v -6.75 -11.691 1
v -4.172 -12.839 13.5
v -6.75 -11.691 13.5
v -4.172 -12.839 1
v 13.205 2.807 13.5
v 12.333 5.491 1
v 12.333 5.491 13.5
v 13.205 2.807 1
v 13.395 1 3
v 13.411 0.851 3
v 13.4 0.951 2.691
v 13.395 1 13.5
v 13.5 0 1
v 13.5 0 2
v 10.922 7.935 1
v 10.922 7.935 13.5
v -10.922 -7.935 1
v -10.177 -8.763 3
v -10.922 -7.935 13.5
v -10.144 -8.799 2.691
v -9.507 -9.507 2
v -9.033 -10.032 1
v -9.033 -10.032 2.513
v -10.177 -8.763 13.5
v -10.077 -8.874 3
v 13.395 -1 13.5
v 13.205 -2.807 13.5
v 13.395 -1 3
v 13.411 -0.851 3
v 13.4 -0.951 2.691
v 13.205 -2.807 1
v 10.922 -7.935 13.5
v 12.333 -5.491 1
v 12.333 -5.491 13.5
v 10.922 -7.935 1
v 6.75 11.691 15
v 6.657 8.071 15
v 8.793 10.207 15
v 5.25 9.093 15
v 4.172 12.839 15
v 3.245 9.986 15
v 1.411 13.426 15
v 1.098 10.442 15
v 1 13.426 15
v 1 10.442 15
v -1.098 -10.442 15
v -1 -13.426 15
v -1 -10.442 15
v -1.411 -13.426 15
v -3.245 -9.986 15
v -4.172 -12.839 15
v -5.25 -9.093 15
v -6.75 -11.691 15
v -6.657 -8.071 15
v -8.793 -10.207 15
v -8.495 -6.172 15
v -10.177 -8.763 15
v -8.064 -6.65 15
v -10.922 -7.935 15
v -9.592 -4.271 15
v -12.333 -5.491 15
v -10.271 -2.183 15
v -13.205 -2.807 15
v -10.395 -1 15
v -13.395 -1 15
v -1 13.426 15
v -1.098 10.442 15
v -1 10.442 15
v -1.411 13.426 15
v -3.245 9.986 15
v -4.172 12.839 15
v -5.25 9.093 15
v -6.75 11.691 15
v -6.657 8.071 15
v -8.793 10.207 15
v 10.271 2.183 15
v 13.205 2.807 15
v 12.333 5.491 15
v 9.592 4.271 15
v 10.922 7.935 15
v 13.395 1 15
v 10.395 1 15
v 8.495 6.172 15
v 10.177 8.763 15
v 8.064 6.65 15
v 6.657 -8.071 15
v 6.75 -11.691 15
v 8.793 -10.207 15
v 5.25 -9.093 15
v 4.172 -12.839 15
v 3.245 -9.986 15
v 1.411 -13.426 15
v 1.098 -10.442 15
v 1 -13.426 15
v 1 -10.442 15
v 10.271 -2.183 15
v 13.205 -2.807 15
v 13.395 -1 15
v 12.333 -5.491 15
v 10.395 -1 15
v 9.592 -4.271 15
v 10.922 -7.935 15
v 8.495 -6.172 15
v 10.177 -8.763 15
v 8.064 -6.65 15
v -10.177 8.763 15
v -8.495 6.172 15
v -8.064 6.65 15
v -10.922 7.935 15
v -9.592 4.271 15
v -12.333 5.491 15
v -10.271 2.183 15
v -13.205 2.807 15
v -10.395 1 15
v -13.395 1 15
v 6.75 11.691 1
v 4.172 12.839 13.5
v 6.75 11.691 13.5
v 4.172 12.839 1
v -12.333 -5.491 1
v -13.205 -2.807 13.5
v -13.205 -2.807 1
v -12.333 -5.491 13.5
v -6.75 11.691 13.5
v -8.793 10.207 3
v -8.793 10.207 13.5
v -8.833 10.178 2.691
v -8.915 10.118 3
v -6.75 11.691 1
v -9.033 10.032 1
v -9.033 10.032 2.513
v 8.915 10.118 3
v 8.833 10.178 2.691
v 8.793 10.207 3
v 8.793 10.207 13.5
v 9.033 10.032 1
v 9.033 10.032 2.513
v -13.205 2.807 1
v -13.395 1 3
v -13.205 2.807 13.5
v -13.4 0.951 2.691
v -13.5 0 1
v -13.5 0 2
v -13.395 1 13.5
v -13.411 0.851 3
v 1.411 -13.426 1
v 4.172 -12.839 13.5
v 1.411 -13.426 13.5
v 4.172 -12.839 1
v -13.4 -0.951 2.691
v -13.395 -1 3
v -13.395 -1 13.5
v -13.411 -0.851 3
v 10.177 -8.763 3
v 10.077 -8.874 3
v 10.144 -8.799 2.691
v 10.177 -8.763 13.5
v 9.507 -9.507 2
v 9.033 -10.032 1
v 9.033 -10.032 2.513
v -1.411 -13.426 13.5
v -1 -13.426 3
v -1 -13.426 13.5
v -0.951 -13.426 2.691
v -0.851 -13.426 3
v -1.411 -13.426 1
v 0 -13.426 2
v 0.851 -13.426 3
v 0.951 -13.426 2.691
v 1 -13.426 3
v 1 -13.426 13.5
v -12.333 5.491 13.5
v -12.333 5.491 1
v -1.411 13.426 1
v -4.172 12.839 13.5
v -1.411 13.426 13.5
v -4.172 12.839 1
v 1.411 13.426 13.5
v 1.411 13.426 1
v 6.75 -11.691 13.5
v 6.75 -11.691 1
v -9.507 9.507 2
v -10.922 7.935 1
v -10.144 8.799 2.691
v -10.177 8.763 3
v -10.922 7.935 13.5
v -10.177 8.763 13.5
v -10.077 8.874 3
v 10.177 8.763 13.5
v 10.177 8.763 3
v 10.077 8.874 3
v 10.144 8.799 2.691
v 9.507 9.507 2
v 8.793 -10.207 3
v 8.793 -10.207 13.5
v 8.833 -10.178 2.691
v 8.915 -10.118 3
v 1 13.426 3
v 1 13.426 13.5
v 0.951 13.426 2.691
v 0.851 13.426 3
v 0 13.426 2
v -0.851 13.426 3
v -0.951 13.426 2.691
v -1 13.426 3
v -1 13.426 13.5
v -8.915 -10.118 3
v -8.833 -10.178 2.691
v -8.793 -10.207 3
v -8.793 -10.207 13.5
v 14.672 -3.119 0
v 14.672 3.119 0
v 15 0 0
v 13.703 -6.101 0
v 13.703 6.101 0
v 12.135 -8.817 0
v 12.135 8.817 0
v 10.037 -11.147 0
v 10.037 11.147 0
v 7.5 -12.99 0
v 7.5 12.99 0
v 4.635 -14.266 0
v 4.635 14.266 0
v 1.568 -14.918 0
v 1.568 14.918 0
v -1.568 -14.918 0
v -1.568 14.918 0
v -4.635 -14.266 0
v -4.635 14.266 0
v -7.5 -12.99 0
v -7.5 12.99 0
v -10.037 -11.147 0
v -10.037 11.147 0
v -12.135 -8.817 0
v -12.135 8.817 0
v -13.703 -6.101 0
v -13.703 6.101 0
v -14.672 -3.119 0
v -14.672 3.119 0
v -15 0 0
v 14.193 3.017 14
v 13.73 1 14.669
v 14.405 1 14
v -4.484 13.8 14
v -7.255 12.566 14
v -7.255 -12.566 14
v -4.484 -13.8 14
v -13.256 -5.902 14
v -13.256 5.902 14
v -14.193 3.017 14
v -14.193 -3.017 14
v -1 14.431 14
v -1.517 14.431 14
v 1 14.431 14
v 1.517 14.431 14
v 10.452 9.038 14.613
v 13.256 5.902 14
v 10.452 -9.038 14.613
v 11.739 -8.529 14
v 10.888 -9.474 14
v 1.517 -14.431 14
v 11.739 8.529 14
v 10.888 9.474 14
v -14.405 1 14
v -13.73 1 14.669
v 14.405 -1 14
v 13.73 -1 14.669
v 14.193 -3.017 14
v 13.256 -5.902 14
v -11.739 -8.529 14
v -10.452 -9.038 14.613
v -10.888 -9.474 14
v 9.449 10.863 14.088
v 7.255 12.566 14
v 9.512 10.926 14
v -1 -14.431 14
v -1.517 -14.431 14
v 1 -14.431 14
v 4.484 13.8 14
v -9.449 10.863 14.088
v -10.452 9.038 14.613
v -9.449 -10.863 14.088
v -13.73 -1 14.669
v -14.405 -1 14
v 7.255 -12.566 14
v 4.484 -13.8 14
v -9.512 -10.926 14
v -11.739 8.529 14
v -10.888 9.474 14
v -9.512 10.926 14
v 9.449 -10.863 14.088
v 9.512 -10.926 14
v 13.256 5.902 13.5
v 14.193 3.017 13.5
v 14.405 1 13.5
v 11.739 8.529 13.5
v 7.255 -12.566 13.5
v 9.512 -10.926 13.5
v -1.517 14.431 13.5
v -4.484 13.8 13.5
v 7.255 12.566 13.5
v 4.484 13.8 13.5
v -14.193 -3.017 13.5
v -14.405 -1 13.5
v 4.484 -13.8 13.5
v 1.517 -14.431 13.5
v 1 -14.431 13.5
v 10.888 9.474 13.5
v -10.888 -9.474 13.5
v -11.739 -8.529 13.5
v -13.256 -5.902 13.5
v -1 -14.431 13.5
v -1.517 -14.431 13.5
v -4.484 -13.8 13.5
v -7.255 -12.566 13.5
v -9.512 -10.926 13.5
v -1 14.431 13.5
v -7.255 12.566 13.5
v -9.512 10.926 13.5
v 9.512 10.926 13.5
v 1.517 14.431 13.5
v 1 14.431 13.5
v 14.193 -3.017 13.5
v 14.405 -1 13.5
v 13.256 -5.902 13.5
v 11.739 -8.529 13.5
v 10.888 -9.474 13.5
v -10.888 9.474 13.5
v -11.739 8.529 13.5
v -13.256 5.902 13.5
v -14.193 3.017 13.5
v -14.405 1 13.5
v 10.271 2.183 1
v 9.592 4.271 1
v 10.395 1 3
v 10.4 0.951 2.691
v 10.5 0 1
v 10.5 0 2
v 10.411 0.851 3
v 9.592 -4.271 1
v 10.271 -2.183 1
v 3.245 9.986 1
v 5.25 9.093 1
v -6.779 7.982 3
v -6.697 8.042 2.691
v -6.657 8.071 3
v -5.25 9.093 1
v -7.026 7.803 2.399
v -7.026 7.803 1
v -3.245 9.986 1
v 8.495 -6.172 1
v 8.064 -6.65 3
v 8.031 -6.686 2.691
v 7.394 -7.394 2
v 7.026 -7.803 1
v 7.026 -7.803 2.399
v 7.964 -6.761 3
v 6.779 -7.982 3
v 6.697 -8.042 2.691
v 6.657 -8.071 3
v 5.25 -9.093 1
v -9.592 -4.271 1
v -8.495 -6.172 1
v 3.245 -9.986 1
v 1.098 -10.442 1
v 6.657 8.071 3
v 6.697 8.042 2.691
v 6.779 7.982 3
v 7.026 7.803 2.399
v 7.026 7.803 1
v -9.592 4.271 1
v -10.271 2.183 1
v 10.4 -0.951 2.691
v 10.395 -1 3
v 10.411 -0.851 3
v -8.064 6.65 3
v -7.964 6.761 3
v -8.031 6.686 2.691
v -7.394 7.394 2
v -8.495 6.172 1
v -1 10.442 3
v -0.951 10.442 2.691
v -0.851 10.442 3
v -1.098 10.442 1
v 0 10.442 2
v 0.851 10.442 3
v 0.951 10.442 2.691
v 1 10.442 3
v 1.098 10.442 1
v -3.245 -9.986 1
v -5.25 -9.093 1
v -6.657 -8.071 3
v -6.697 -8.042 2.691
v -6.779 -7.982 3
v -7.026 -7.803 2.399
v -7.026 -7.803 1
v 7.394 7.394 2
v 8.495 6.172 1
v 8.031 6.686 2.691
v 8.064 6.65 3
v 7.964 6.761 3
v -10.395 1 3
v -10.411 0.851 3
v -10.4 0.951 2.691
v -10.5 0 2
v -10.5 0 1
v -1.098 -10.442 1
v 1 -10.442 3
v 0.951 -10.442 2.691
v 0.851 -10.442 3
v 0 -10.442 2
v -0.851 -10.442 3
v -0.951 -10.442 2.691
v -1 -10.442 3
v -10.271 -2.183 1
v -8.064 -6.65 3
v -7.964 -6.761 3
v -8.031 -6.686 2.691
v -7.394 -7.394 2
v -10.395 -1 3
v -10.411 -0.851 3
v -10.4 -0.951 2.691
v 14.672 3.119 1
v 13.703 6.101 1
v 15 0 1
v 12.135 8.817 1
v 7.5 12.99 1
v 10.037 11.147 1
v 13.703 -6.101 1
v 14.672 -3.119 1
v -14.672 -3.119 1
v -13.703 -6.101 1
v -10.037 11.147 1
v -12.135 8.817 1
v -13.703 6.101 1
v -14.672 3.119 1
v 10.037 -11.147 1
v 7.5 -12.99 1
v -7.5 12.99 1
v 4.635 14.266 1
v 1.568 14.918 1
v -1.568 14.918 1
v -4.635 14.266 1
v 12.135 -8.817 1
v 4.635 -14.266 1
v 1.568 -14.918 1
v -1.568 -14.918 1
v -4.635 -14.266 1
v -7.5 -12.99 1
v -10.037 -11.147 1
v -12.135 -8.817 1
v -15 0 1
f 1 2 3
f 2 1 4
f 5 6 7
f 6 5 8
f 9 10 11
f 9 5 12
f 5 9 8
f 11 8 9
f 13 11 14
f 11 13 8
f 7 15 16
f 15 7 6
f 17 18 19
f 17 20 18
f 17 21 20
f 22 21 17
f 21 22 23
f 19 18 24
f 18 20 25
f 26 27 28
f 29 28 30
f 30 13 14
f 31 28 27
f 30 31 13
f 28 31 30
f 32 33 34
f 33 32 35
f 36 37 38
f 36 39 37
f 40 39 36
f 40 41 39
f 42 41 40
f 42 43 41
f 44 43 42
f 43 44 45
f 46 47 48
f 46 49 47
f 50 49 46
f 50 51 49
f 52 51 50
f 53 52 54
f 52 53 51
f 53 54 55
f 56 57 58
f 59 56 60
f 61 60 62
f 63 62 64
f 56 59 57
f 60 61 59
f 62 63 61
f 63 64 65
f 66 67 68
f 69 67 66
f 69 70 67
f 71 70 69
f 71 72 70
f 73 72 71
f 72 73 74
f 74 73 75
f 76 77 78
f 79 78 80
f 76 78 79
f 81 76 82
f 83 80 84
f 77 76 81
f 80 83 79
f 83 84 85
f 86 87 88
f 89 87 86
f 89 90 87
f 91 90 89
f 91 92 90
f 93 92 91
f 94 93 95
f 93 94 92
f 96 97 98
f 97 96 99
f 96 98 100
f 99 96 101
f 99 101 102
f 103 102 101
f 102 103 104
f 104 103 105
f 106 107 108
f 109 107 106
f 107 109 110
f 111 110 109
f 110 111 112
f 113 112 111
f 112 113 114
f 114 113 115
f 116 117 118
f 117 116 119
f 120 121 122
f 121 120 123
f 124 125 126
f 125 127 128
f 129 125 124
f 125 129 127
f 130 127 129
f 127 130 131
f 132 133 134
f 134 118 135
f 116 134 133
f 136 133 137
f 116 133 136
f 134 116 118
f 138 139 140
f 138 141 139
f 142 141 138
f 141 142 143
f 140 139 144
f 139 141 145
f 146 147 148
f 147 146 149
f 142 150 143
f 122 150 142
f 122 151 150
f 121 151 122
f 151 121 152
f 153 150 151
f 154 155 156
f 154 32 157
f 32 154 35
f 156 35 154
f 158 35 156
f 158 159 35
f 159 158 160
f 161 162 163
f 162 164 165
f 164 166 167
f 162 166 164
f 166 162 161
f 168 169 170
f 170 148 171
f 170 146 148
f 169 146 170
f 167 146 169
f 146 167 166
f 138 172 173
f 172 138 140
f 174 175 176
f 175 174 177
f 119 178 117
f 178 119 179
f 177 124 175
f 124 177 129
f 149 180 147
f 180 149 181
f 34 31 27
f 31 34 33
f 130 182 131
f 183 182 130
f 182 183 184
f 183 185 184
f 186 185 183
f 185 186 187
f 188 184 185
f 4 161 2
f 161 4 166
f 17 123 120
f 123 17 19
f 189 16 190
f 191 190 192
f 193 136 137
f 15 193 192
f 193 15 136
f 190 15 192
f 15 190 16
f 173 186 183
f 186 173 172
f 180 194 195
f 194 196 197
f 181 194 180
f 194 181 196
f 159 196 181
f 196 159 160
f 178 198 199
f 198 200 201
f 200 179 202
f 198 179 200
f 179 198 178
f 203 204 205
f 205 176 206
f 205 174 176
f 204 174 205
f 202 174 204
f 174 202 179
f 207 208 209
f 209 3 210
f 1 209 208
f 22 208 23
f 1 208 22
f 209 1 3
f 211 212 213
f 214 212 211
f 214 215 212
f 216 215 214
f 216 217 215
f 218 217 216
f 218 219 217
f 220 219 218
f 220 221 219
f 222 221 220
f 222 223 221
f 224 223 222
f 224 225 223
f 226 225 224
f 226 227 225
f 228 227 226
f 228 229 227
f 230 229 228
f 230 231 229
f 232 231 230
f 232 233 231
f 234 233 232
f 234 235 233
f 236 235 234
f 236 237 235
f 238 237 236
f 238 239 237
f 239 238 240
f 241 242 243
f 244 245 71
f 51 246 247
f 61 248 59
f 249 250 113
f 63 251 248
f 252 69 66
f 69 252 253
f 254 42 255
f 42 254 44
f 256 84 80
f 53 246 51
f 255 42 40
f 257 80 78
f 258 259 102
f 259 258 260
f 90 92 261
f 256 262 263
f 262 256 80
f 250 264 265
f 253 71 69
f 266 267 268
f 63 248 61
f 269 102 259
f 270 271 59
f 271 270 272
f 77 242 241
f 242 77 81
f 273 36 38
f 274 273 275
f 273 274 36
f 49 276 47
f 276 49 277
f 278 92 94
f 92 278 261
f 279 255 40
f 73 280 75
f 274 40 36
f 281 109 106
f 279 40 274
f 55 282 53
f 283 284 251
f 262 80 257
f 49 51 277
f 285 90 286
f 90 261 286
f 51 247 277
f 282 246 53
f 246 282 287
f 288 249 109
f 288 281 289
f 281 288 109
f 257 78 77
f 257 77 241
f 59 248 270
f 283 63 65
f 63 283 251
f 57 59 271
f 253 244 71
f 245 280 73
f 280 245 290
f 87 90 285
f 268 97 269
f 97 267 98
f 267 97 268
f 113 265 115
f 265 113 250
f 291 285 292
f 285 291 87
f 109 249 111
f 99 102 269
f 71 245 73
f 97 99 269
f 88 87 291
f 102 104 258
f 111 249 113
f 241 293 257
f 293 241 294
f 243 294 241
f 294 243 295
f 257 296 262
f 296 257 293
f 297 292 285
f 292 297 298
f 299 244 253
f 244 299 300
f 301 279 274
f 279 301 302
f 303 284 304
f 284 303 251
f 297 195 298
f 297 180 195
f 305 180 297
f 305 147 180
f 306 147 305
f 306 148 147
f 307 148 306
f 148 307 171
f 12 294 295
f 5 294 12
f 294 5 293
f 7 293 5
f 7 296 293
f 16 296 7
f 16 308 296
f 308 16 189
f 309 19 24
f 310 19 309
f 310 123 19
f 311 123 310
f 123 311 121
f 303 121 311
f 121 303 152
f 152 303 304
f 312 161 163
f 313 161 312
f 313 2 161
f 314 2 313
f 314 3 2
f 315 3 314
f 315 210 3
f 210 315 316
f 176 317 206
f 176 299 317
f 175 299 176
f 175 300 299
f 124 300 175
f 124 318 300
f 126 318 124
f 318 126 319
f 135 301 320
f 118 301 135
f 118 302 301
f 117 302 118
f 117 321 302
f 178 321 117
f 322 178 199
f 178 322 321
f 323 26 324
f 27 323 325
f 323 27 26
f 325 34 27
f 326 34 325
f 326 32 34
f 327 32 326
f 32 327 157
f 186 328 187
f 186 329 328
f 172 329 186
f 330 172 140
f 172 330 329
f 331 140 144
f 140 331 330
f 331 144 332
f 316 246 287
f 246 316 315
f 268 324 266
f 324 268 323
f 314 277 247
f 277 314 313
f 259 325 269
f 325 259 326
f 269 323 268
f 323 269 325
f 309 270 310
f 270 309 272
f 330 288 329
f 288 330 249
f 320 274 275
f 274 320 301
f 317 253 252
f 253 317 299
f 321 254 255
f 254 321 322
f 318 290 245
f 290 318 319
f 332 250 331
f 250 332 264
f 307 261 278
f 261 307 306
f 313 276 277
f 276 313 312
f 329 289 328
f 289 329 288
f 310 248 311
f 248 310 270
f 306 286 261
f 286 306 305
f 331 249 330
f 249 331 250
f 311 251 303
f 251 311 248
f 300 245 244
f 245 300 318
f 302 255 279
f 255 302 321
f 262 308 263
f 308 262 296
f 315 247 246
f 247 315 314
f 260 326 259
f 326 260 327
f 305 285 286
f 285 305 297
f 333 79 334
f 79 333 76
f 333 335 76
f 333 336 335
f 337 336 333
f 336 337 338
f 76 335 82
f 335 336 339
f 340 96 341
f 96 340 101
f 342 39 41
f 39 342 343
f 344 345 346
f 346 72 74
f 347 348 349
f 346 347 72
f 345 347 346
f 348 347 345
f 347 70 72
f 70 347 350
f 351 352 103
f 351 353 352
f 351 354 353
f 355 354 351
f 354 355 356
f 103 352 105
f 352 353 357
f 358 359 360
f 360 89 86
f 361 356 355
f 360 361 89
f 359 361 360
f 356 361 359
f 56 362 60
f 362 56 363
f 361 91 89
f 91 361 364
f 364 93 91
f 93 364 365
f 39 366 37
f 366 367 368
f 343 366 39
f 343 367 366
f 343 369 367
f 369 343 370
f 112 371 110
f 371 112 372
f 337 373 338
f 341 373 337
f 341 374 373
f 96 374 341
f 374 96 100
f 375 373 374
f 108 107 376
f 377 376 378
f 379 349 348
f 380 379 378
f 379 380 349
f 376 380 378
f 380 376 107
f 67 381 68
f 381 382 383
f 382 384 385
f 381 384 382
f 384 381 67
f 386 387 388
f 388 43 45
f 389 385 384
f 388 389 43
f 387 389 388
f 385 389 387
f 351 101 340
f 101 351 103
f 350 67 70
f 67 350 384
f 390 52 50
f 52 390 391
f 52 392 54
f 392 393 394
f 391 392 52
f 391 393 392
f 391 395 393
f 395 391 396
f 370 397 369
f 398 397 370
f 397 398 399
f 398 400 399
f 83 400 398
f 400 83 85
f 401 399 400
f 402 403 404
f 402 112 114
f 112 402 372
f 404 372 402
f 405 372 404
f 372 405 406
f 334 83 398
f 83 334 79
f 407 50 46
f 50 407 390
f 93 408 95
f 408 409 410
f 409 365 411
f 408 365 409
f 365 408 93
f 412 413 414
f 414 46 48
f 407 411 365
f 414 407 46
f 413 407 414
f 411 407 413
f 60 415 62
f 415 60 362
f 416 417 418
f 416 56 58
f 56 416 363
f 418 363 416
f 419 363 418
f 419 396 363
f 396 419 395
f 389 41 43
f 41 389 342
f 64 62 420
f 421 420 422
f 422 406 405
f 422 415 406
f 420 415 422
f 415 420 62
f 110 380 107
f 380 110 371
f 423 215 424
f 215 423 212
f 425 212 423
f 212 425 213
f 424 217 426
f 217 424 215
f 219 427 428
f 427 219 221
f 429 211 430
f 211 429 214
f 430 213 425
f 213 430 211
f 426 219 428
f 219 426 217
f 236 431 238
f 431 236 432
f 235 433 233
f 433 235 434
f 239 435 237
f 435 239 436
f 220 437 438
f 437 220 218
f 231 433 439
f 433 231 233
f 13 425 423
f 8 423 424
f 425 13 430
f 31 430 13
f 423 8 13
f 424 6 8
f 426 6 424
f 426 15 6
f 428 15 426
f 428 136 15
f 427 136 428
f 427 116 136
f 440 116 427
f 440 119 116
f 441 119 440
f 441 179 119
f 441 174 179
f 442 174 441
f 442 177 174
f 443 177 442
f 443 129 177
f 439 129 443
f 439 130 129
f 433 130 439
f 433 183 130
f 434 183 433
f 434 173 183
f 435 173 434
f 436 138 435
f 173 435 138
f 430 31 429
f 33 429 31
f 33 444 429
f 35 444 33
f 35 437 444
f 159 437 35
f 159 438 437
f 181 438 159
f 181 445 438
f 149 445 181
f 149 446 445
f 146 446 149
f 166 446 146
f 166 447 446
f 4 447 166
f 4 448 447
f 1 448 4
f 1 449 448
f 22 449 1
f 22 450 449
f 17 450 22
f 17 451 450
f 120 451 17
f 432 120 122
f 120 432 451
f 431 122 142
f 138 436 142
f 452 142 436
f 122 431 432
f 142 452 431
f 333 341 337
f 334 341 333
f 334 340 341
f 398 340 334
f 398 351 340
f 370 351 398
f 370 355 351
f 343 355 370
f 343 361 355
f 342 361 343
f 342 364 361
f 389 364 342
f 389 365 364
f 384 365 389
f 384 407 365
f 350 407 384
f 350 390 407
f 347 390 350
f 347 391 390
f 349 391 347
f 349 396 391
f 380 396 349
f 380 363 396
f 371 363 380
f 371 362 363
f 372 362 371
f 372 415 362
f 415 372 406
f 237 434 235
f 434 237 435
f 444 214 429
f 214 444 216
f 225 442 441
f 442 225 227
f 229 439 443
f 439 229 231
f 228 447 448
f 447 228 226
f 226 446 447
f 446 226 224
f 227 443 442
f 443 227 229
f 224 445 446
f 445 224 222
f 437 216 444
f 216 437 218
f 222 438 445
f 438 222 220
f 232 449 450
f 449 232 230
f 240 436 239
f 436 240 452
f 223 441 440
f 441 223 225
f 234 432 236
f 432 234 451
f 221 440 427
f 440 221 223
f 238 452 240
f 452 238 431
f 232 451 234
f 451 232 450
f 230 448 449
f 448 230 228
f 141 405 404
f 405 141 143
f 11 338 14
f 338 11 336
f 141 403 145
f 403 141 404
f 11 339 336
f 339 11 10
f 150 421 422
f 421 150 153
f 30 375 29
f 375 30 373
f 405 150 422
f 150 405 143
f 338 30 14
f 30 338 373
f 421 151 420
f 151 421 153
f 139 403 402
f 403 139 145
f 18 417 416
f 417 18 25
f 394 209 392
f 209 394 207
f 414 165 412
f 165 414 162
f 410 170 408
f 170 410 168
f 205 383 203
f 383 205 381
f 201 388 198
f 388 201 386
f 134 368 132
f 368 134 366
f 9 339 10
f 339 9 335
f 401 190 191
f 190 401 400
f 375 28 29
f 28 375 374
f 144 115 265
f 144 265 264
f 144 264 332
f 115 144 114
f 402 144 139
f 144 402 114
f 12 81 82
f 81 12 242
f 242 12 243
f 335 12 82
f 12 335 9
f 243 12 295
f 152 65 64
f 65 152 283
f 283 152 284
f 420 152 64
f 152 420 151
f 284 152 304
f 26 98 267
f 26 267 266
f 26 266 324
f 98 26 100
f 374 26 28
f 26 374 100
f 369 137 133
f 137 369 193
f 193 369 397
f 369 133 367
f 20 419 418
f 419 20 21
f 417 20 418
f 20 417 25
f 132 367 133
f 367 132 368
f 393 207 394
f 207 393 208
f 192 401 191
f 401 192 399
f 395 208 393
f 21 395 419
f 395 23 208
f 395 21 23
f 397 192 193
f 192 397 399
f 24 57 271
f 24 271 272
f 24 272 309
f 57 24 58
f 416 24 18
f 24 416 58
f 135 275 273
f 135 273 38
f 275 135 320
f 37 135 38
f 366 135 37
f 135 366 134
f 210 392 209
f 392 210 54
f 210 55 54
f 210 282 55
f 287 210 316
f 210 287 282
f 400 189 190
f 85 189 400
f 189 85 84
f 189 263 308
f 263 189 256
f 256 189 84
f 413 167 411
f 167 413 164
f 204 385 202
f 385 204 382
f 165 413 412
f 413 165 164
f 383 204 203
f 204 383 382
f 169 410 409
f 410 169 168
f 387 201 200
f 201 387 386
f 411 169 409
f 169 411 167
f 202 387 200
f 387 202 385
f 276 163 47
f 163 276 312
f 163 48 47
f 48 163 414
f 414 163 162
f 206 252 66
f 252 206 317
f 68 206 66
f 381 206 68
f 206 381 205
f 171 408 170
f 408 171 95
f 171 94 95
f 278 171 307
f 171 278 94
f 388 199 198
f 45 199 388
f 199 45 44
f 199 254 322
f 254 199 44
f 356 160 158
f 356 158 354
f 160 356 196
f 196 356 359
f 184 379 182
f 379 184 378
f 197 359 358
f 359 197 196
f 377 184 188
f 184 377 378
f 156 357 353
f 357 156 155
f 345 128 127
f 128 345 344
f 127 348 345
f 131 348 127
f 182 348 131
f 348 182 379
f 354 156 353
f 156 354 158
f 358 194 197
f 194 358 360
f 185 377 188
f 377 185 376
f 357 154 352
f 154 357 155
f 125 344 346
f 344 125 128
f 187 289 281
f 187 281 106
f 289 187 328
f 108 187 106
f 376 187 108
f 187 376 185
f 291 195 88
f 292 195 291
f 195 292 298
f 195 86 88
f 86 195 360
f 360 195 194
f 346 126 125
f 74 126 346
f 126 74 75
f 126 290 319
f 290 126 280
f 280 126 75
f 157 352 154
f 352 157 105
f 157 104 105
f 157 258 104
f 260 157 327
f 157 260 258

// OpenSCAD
// file: settings.scad
/*
The OpenTRV project licenses this file to you
under the Apache Licence, Version 2.0 (the "Licence");
you may not use this file except in compliance
with the Licence. You may obtain a copy of the Licence at

http://www.apache.org/licenses/LICENSE-2.0

Unless required by applicable law or agreed to in writing,
software distributed under the Licence is distributed on an
"AS IS" BASIS, WITHOUT WARRANTIES OR CONDITIONS OF ANY
KIND, either express or implied. See the Licence for the
specific language governing permissions and limitations
under the Licence.

Author(s) / Copyright (s): Bruno Girin 2013
*/

/* General constants */
TOP    = 0;
RIGHT  = 1;
BOTTOM = 2;
LEFT   = 3;

/*
PCB board measurements

All measurements and placements are taken such that the version number (V0.09)
is facing the right way up.
*/
/* The basic measurements of the PCB */
pcb_width = 47;
pcb_length = 46;
pcb_thickness = 1.7;
/* There are four mounting holes in each corner of the PCB */
pcb_mounting_hole_radius = 1.5; /* Fits an M3 bolt */
pcb_mounting_hole_to_edge = 0.8;
pcb_mounting_hole_max_padding = 1.5;

/* Settings for the box itself */
box_wall_width = 3;
box_layer_thickness = 3;
box_corner_radius = 2;

/*
Valve attachment measurements

All measurements below are used by the test valve connector.
*/

// Screw attributes. At the moment, the only supported combination is:
// diameter: 30, pitch:1.5
screw_diameter=30;
screw_pitch=1.5;
// The screw tolerance allows the screw connector to be scale slightly in order
// to give a bit of tolerance to how snuggly the screw fits the valve
screw_tolerance=0.01;
screw_height=10;
screw_thickness=2;
screw_protusion_number=12;

// Connector attributes
connector_height=15;
connector_slit_number=8; // this has to be an even number (for the moment)
connector_slit_thickness=2;
connector_slit_offset=3;
connector_plate_thickness=1;
// main file
/*
The OpenTRV project licenses this file to you
under the Apache Licence, Version 2.0 (the "Licence");
you may not use this file except in compliance
with the Licence. You may obtain a copy of the Licence at

http://www.apache.org/licenses/LICENSE-2.0

Unless required by applicable law or agreed to in writing,
software distributed under the Licence is distributed on an
"AS IS" BASIS, WITHOUT WARRANTIES OR CONDITIONS OF ANY
KIND, either express or implied. See the Licence for the
specific language governing permissions and limitations
under the Licence.

Author(s) / Copyright (s): Bruno Girin 2013
*/

include <./settings.scad>;

screw_radius = screw_diameter / 2;
ext_radius = screw_radius * 13.5 / 15.0;
int_radius = screw_radius * 10.5 / 15.0;
lip_radius = screw_radius * 14.5 / 15.0 + screw_tolerance;
bevel_height = 1;
lip_height = 0.5;
slit_angle = 360 / connector_slit_number;

difference() {
    union() {
        difference() {
            union() {
                cylinder(h = connector_height, r = ext_radius);
                translate([0, 0, connector_height - bevel_height])
                    cylinder(h = bevel_height, r1 = lip_radius, r2 = ext_radius);
                translate([0, 0, connector_height - bevel_height - lip_height])
                    cylinder(h = lip_height, r = lip_radius);
            }
            translate([0, 0, -1])
                cylinder(h = connector_height + 2, r = int_radius);
        }
        cylinder(h = connector_plate_thickness, r = screw_radius);
    }

    for ( i = [0 : connector_slit_number / 2 - 1] ) {
        rotate(a = slit_angle * i, v = [0, 0, 1])
        translate([0, 0, connector_slit_offset]) {
            union() {
                rotate(a = 90, v = [0, 1, 0])
                    translate([0, 0, -screw_radius])
                        cylinder(h = screw_diameter, r = connector_slit_thickness / 2);
                translate([0, 0, screw_radius / 2])
                    cube(size = [screw_diameter, connector_slit_thickness, screw_radius], center = true);
            }
        }
    }
}
